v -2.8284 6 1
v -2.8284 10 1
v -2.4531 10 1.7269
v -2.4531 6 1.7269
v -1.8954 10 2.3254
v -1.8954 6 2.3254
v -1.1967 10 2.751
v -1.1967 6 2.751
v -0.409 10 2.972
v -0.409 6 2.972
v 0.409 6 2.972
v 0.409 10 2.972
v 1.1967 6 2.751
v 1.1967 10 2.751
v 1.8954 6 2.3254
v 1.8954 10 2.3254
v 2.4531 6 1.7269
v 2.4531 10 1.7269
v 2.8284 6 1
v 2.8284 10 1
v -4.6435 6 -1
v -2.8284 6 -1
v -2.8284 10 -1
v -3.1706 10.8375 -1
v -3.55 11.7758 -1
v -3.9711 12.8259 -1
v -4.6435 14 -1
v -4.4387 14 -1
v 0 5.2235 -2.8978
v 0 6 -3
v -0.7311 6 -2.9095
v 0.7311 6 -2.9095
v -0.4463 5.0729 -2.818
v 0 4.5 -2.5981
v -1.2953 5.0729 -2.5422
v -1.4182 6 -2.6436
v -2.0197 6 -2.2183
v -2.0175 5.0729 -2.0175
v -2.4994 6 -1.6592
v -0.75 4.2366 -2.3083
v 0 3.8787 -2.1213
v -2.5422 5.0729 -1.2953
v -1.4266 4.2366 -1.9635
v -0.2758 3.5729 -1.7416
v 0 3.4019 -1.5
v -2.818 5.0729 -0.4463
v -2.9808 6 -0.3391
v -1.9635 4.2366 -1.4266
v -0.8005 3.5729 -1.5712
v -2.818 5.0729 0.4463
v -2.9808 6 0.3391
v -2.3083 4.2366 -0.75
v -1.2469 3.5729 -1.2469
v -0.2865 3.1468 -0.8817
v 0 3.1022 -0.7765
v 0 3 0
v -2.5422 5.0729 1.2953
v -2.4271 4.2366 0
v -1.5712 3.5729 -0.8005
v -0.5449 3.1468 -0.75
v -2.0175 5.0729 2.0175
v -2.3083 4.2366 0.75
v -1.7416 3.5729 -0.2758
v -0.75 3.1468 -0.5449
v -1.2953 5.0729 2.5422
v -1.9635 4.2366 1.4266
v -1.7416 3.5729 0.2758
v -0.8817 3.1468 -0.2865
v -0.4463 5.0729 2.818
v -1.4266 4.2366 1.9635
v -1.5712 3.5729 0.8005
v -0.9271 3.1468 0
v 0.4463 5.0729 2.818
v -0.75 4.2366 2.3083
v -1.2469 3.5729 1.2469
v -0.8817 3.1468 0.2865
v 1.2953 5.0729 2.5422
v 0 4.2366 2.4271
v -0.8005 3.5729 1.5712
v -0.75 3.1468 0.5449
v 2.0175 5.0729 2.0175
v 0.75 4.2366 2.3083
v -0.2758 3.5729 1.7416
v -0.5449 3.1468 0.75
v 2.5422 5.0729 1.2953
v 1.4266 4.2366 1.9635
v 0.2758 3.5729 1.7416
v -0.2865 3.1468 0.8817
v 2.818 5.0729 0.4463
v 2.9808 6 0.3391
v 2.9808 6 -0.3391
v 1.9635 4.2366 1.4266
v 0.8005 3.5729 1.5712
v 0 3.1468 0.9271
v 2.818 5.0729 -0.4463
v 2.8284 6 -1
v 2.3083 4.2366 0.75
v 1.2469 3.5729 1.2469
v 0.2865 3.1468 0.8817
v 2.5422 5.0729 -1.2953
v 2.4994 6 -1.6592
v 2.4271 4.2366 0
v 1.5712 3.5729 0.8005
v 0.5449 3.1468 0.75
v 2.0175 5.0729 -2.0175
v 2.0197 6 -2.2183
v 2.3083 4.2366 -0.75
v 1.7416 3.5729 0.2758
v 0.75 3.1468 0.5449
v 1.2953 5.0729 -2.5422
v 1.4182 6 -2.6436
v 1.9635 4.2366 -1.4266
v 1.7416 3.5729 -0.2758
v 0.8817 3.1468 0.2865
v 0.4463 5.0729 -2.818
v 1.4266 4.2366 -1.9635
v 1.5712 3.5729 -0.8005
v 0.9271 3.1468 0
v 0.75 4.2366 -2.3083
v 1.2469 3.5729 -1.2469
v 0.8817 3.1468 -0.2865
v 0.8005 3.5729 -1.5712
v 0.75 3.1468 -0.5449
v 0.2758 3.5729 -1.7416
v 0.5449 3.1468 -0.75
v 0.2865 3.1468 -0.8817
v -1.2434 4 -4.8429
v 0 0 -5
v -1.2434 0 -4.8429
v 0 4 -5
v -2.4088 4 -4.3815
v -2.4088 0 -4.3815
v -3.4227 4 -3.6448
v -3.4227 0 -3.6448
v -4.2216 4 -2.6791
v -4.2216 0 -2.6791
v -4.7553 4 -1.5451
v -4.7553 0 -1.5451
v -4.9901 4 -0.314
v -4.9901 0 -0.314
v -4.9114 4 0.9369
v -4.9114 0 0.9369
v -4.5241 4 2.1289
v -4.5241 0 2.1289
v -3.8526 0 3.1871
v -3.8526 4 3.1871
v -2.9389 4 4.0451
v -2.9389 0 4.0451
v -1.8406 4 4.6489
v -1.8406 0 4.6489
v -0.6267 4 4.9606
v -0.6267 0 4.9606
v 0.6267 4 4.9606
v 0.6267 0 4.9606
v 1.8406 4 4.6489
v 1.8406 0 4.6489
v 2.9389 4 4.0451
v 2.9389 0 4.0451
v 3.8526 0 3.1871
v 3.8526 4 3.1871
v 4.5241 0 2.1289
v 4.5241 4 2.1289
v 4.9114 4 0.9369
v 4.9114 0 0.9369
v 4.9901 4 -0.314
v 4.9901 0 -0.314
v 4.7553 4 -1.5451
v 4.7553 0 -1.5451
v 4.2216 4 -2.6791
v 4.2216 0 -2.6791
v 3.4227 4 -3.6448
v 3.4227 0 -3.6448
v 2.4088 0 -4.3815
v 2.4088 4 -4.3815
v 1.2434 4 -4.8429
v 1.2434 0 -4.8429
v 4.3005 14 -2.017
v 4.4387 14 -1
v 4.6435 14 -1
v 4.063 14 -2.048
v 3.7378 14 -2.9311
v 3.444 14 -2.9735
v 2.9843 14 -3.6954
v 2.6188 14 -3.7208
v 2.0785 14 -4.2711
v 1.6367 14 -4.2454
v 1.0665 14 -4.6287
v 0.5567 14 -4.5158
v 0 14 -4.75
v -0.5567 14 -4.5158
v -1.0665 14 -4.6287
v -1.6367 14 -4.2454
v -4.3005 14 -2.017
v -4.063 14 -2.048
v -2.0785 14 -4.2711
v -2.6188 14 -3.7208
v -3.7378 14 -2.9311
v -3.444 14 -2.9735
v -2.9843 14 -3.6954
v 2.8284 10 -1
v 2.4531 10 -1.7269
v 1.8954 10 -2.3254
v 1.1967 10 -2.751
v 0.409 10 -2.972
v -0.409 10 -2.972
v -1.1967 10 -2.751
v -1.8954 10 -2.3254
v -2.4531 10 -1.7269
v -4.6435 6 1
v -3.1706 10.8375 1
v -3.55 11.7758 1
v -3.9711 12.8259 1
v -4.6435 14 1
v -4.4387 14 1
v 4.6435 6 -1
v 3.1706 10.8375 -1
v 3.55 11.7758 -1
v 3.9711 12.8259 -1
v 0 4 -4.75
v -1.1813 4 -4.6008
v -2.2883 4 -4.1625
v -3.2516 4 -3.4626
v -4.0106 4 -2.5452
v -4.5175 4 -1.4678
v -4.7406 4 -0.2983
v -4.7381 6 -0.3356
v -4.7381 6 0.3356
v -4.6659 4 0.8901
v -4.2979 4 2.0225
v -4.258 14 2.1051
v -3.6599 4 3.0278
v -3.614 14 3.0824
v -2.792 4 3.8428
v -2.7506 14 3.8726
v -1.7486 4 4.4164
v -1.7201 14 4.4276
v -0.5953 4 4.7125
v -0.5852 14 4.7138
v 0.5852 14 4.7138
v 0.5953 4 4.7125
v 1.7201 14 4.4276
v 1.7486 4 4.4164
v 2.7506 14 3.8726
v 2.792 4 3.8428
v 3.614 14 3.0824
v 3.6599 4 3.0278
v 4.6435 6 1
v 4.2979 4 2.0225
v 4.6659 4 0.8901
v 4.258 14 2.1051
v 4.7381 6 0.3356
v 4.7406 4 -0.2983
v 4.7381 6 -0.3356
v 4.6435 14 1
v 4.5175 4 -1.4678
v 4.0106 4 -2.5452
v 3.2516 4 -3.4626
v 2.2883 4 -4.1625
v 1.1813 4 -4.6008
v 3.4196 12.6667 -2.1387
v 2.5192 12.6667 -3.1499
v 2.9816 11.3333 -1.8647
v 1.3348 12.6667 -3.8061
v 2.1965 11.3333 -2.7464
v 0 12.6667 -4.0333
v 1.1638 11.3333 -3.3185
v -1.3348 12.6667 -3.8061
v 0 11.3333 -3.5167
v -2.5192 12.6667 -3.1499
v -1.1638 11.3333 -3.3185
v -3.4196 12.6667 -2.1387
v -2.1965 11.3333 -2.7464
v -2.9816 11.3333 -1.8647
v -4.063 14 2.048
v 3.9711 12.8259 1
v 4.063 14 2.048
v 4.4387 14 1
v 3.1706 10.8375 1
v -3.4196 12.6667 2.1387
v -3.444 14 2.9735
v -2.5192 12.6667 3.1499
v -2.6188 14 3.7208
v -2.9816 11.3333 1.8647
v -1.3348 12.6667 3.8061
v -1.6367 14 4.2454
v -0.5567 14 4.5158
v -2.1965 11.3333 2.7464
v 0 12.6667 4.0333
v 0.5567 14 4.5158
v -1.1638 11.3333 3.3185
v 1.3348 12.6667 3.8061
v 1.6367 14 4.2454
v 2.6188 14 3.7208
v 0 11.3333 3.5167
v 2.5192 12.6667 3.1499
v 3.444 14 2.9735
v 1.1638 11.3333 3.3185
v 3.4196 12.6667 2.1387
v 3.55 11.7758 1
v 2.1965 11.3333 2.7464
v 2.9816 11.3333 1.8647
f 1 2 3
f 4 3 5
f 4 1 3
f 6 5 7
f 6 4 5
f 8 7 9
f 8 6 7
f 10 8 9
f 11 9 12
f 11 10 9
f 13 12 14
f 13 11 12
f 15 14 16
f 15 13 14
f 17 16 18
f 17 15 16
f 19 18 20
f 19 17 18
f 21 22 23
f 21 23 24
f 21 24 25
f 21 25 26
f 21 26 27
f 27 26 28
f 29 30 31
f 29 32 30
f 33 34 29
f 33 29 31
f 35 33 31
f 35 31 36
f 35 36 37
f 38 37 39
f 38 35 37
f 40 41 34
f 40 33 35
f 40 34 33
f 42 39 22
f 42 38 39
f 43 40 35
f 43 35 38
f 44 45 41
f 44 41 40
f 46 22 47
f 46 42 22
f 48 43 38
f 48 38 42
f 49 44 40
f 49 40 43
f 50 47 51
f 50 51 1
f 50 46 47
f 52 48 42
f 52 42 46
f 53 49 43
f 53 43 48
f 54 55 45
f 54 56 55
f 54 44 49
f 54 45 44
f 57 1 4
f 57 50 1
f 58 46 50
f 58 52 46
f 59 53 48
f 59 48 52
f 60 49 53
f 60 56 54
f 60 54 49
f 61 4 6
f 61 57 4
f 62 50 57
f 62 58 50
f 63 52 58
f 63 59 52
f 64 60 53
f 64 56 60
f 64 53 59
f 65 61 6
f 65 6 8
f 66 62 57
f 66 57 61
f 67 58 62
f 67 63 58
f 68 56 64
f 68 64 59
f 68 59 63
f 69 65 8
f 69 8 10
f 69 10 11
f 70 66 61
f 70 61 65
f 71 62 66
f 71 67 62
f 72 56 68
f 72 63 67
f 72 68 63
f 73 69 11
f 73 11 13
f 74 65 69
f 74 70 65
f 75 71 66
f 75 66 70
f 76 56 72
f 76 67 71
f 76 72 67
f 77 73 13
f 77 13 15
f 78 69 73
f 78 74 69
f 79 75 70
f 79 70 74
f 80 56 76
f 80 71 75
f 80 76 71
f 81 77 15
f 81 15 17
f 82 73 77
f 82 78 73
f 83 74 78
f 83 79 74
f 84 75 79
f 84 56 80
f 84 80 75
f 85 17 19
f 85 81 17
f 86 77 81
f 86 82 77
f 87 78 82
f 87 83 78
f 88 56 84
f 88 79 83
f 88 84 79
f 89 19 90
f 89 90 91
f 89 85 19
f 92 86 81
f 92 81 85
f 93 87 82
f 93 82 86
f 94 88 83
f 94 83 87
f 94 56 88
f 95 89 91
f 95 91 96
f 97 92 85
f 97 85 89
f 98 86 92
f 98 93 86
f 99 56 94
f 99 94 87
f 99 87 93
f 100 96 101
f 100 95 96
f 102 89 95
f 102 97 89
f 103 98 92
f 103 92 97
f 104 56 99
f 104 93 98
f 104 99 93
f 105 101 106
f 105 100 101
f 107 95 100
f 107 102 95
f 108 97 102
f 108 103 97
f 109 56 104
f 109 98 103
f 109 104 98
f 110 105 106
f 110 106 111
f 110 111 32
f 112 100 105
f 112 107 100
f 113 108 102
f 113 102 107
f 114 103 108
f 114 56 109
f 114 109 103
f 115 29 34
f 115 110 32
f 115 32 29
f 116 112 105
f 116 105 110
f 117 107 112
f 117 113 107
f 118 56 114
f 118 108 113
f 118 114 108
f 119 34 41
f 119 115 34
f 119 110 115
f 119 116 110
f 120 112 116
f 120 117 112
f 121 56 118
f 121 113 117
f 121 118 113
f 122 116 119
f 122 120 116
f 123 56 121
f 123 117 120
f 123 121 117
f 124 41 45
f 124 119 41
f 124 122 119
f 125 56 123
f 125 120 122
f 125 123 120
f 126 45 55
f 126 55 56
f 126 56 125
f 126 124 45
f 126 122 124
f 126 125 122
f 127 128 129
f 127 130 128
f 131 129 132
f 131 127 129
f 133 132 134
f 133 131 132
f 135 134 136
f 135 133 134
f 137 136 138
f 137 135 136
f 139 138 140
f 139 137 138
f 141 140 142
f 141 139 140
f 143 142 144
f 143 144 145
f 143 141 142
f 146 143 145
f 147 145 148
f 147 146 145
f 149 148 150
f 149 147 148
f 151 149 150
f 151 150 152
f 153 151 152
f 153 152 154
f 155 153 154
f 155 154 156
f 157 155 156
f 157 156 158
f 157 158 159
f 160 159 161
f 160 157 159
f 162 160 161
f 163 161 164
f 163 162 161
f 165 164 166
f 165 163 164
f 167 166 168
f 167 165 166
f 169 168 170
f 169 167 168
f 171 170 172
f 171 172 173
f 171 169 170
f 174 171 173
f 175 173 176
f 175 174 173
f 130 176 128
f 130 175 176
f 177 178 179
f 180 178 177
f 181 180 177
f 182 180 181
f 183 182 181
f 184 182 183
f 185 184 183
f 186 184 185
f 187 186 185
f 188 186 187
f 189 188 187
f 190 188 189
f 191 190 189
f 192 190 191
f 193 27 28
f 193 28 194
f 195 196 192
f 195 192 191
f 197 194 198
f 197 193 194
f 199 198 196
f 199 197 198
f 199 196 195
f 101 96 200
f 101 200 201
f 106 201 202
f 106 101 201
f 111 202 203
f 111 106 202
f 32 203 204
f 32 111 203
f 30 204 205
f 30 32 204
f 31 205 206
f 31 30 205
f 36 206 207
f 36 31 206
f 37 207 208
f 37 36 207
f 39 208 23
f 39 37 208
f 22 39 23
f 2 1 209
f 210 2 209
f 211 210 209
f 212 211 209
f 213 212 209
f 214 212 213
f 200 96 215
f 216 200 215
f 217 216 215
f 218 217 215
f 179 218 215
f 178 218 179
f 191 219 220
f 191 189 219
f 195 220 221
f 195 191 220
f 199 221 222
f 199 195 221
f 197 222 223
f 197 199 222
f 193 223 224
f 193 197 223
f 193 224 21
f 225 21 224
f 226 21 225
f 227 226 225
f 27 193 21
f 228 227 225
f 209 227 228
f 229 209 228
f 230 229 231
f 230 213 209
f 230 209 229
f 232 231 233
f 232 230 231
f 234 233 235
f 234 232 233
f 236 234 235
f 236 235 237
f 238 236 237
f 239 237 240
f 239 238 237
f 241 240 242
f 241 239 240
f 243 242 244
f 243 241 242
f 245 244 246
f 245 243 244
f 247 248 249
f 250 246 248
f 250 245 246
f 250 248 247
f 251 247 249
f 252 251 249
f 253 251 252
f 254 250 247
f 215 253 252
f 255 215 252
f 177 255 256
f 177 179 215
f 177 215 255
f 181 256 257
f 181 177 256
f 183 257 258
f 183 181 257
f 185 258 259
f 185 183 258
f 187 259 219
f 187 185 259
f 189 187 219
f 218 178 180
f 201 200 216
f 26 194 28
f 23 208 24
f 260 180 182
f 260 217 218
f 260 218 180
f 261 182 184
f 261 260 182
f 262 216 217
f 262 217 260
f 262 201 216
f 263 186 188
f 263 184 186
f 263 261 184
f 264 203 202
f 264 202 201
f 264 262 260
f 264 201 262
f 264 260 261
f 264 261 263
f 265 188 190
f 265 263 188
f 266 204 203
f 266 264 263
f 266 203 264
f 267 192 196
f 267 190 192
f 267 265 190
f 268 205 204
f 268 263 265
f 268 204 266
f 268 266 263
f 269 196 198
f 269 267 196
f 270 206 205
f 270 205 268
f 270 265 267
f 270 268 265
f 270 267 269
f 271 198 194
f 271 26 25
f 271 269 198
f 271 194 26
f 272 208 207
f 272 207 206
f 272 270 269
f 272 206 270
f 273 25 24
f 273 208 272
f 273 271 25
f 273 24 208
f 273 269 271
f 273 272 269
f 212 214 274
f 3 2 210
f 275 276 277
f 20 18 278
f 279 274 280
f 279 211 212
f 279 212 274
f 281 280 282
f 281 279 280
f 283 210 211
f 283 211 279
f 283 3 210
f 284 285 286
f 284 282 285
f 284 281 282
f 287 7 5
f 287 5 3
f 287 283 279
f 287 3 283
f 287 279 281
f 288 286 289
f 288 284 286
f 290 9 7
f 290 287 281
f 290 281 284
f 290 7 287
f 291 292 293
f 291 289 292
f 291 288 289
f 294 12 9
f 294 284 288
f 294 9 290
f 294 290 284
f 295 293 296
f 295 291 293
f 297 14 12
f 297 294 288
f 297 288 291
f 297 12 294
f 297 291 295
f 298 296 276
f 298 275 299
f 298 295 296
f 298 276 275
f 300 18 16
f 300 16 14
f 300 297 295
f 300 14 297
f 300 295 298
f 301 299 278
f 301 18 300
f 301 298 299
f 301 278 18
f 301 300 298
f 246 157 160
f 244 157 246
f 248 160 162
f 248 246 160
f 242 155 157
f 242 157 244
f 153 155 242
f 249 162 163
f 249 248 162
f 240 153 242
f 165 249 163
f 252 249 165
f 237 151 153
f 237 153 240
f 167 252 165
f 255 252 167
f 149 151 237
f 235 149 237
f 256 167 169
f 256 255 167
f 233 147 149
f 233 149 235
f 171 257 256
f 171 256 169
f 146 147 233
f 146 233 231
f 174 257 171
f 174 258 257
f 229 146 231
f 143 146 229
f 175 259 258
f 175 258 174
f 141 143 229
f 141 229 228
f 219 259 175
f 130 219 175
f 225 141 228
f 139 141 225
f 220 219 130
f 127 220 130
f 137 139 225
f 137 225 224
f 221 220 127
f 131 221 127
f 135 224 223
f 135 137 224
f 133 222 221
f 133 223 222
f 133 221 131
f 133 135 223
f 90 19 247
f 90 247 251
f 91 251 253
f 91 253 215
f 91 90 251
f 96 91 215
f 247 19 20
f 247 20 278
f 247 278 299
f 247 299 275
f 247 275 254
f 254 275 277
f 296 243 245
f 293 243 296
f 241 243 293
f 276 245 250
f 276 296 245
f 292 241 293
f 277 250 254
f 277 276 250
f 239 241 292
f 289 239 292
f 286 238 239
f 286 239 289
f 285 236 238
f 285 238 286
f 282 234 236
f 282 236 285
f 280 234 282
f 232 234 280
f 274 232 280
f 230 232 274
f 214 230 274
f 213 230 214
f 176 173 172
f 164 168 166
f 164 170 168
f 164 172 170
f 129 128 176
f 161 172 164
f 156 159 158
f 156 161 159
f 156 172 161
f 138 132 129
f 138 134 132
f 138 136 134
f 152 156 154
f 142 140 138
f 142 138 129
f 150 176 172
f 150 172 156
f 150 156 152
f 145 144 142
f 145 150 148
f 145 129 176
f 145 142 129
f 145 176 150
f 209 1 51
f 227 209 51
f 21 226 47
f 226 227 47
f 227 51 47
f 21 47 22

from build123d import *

# Parameters (mm, degrees)
ENL_V_MAT_EXTRU_1_REACH             = 17.684
ESQUISSE2_W                         = 2
ESQUISSE2_H                         = 8
ENL_V_MAT_EXTRU_1_DIRECTION_2_REACH = 17.684


with BuildPart() as part:
    # Esquisse1 → Révolution1 (revolve)
    with BuildSketch(Plane.XY, mode=Mode.PRIVATE) as r_volution1_sk:
        with BuildLine():
            Line((0, 0), (-5, 0))
            Line((-5, 0), (-5, 4))
            Line((-5, 4), (-4.75, 4))
            Line((-4.75, 4), (-4.75, 14))
            Line((-4.75, 14), (-4.55, 14))
            Line((-4.55, 14), (-3, 10))
            Line((-3, 10), (-3, 6))
            ThreePointArc((-3, 6), (-2.121320344, 3.878679656), (0, 3))
            Line((0, 3), (0, 0))
        make_face()
    revolve(r_volution1_sk.sketch.rotate(Axis((0, -3.503417728, 0), (0, 1, 0)), 270), axis=Axis((0, -3.503417728, 0), (0, 1, 0)))

    # Esquisse2 → Enlèv. mat.-Extru.1 (cut, up to next)
    with BuildSketch(Plane(origin=(0, 0, 0), x_dir=(0, 0, -1), z_dir=(1, 0, 0)), mode=Mode.PRIVATE) as enl_v_mat_extru_1_sk1:
        with Locations((0, 10)):
            Rectangle(ESQUISSE2_W, ESQUISSE2_H)
    enl_v_mat_extru_1_tool1 = extrude(enl_v_mat_extru_1_sk1.sketch, amount=-ENL_V_MAT_EXTRU_1_REACH, mode=Mode.PRIVATE) & part.part
    add(enl_v_mat_extru_1_tool1.solids().sort_by_distance((0, 10, 0))[0], mode=Mode.SUBTRACT)

    # Esquisse2 → Enlèv. mat.-Extru.1 direction 2 (cut, up to next)
    with BuildSketch(Plane(origin=(0, 0, 0), x_dir=(0, 0, -1), z_dir=(1, 0, 0)), mode=Mode.PRIVATE) as enl_v_mat_extru_1_direction_2_sk1:
        with Locations((0, 10)):
            Rectangle(ESQUISSE2_W, ESQUISSE2_H)
    enl_v_mat_extru_1_direction_2_tool1 = extrude(enl_v_mat_extru_1_direction_2_sk1.sketch, amount=ENL_V_MAT_EXTRU_1_DIRECTION_2_REACH, mode=Mode.PRIVATE) & part.part
    add(enl_v_mat_extru_1_direction_2_tool1.solids().sort_by_distance((0, 10, 0))[0], mode=Mode.SUBTRACT)


solid = part.part
